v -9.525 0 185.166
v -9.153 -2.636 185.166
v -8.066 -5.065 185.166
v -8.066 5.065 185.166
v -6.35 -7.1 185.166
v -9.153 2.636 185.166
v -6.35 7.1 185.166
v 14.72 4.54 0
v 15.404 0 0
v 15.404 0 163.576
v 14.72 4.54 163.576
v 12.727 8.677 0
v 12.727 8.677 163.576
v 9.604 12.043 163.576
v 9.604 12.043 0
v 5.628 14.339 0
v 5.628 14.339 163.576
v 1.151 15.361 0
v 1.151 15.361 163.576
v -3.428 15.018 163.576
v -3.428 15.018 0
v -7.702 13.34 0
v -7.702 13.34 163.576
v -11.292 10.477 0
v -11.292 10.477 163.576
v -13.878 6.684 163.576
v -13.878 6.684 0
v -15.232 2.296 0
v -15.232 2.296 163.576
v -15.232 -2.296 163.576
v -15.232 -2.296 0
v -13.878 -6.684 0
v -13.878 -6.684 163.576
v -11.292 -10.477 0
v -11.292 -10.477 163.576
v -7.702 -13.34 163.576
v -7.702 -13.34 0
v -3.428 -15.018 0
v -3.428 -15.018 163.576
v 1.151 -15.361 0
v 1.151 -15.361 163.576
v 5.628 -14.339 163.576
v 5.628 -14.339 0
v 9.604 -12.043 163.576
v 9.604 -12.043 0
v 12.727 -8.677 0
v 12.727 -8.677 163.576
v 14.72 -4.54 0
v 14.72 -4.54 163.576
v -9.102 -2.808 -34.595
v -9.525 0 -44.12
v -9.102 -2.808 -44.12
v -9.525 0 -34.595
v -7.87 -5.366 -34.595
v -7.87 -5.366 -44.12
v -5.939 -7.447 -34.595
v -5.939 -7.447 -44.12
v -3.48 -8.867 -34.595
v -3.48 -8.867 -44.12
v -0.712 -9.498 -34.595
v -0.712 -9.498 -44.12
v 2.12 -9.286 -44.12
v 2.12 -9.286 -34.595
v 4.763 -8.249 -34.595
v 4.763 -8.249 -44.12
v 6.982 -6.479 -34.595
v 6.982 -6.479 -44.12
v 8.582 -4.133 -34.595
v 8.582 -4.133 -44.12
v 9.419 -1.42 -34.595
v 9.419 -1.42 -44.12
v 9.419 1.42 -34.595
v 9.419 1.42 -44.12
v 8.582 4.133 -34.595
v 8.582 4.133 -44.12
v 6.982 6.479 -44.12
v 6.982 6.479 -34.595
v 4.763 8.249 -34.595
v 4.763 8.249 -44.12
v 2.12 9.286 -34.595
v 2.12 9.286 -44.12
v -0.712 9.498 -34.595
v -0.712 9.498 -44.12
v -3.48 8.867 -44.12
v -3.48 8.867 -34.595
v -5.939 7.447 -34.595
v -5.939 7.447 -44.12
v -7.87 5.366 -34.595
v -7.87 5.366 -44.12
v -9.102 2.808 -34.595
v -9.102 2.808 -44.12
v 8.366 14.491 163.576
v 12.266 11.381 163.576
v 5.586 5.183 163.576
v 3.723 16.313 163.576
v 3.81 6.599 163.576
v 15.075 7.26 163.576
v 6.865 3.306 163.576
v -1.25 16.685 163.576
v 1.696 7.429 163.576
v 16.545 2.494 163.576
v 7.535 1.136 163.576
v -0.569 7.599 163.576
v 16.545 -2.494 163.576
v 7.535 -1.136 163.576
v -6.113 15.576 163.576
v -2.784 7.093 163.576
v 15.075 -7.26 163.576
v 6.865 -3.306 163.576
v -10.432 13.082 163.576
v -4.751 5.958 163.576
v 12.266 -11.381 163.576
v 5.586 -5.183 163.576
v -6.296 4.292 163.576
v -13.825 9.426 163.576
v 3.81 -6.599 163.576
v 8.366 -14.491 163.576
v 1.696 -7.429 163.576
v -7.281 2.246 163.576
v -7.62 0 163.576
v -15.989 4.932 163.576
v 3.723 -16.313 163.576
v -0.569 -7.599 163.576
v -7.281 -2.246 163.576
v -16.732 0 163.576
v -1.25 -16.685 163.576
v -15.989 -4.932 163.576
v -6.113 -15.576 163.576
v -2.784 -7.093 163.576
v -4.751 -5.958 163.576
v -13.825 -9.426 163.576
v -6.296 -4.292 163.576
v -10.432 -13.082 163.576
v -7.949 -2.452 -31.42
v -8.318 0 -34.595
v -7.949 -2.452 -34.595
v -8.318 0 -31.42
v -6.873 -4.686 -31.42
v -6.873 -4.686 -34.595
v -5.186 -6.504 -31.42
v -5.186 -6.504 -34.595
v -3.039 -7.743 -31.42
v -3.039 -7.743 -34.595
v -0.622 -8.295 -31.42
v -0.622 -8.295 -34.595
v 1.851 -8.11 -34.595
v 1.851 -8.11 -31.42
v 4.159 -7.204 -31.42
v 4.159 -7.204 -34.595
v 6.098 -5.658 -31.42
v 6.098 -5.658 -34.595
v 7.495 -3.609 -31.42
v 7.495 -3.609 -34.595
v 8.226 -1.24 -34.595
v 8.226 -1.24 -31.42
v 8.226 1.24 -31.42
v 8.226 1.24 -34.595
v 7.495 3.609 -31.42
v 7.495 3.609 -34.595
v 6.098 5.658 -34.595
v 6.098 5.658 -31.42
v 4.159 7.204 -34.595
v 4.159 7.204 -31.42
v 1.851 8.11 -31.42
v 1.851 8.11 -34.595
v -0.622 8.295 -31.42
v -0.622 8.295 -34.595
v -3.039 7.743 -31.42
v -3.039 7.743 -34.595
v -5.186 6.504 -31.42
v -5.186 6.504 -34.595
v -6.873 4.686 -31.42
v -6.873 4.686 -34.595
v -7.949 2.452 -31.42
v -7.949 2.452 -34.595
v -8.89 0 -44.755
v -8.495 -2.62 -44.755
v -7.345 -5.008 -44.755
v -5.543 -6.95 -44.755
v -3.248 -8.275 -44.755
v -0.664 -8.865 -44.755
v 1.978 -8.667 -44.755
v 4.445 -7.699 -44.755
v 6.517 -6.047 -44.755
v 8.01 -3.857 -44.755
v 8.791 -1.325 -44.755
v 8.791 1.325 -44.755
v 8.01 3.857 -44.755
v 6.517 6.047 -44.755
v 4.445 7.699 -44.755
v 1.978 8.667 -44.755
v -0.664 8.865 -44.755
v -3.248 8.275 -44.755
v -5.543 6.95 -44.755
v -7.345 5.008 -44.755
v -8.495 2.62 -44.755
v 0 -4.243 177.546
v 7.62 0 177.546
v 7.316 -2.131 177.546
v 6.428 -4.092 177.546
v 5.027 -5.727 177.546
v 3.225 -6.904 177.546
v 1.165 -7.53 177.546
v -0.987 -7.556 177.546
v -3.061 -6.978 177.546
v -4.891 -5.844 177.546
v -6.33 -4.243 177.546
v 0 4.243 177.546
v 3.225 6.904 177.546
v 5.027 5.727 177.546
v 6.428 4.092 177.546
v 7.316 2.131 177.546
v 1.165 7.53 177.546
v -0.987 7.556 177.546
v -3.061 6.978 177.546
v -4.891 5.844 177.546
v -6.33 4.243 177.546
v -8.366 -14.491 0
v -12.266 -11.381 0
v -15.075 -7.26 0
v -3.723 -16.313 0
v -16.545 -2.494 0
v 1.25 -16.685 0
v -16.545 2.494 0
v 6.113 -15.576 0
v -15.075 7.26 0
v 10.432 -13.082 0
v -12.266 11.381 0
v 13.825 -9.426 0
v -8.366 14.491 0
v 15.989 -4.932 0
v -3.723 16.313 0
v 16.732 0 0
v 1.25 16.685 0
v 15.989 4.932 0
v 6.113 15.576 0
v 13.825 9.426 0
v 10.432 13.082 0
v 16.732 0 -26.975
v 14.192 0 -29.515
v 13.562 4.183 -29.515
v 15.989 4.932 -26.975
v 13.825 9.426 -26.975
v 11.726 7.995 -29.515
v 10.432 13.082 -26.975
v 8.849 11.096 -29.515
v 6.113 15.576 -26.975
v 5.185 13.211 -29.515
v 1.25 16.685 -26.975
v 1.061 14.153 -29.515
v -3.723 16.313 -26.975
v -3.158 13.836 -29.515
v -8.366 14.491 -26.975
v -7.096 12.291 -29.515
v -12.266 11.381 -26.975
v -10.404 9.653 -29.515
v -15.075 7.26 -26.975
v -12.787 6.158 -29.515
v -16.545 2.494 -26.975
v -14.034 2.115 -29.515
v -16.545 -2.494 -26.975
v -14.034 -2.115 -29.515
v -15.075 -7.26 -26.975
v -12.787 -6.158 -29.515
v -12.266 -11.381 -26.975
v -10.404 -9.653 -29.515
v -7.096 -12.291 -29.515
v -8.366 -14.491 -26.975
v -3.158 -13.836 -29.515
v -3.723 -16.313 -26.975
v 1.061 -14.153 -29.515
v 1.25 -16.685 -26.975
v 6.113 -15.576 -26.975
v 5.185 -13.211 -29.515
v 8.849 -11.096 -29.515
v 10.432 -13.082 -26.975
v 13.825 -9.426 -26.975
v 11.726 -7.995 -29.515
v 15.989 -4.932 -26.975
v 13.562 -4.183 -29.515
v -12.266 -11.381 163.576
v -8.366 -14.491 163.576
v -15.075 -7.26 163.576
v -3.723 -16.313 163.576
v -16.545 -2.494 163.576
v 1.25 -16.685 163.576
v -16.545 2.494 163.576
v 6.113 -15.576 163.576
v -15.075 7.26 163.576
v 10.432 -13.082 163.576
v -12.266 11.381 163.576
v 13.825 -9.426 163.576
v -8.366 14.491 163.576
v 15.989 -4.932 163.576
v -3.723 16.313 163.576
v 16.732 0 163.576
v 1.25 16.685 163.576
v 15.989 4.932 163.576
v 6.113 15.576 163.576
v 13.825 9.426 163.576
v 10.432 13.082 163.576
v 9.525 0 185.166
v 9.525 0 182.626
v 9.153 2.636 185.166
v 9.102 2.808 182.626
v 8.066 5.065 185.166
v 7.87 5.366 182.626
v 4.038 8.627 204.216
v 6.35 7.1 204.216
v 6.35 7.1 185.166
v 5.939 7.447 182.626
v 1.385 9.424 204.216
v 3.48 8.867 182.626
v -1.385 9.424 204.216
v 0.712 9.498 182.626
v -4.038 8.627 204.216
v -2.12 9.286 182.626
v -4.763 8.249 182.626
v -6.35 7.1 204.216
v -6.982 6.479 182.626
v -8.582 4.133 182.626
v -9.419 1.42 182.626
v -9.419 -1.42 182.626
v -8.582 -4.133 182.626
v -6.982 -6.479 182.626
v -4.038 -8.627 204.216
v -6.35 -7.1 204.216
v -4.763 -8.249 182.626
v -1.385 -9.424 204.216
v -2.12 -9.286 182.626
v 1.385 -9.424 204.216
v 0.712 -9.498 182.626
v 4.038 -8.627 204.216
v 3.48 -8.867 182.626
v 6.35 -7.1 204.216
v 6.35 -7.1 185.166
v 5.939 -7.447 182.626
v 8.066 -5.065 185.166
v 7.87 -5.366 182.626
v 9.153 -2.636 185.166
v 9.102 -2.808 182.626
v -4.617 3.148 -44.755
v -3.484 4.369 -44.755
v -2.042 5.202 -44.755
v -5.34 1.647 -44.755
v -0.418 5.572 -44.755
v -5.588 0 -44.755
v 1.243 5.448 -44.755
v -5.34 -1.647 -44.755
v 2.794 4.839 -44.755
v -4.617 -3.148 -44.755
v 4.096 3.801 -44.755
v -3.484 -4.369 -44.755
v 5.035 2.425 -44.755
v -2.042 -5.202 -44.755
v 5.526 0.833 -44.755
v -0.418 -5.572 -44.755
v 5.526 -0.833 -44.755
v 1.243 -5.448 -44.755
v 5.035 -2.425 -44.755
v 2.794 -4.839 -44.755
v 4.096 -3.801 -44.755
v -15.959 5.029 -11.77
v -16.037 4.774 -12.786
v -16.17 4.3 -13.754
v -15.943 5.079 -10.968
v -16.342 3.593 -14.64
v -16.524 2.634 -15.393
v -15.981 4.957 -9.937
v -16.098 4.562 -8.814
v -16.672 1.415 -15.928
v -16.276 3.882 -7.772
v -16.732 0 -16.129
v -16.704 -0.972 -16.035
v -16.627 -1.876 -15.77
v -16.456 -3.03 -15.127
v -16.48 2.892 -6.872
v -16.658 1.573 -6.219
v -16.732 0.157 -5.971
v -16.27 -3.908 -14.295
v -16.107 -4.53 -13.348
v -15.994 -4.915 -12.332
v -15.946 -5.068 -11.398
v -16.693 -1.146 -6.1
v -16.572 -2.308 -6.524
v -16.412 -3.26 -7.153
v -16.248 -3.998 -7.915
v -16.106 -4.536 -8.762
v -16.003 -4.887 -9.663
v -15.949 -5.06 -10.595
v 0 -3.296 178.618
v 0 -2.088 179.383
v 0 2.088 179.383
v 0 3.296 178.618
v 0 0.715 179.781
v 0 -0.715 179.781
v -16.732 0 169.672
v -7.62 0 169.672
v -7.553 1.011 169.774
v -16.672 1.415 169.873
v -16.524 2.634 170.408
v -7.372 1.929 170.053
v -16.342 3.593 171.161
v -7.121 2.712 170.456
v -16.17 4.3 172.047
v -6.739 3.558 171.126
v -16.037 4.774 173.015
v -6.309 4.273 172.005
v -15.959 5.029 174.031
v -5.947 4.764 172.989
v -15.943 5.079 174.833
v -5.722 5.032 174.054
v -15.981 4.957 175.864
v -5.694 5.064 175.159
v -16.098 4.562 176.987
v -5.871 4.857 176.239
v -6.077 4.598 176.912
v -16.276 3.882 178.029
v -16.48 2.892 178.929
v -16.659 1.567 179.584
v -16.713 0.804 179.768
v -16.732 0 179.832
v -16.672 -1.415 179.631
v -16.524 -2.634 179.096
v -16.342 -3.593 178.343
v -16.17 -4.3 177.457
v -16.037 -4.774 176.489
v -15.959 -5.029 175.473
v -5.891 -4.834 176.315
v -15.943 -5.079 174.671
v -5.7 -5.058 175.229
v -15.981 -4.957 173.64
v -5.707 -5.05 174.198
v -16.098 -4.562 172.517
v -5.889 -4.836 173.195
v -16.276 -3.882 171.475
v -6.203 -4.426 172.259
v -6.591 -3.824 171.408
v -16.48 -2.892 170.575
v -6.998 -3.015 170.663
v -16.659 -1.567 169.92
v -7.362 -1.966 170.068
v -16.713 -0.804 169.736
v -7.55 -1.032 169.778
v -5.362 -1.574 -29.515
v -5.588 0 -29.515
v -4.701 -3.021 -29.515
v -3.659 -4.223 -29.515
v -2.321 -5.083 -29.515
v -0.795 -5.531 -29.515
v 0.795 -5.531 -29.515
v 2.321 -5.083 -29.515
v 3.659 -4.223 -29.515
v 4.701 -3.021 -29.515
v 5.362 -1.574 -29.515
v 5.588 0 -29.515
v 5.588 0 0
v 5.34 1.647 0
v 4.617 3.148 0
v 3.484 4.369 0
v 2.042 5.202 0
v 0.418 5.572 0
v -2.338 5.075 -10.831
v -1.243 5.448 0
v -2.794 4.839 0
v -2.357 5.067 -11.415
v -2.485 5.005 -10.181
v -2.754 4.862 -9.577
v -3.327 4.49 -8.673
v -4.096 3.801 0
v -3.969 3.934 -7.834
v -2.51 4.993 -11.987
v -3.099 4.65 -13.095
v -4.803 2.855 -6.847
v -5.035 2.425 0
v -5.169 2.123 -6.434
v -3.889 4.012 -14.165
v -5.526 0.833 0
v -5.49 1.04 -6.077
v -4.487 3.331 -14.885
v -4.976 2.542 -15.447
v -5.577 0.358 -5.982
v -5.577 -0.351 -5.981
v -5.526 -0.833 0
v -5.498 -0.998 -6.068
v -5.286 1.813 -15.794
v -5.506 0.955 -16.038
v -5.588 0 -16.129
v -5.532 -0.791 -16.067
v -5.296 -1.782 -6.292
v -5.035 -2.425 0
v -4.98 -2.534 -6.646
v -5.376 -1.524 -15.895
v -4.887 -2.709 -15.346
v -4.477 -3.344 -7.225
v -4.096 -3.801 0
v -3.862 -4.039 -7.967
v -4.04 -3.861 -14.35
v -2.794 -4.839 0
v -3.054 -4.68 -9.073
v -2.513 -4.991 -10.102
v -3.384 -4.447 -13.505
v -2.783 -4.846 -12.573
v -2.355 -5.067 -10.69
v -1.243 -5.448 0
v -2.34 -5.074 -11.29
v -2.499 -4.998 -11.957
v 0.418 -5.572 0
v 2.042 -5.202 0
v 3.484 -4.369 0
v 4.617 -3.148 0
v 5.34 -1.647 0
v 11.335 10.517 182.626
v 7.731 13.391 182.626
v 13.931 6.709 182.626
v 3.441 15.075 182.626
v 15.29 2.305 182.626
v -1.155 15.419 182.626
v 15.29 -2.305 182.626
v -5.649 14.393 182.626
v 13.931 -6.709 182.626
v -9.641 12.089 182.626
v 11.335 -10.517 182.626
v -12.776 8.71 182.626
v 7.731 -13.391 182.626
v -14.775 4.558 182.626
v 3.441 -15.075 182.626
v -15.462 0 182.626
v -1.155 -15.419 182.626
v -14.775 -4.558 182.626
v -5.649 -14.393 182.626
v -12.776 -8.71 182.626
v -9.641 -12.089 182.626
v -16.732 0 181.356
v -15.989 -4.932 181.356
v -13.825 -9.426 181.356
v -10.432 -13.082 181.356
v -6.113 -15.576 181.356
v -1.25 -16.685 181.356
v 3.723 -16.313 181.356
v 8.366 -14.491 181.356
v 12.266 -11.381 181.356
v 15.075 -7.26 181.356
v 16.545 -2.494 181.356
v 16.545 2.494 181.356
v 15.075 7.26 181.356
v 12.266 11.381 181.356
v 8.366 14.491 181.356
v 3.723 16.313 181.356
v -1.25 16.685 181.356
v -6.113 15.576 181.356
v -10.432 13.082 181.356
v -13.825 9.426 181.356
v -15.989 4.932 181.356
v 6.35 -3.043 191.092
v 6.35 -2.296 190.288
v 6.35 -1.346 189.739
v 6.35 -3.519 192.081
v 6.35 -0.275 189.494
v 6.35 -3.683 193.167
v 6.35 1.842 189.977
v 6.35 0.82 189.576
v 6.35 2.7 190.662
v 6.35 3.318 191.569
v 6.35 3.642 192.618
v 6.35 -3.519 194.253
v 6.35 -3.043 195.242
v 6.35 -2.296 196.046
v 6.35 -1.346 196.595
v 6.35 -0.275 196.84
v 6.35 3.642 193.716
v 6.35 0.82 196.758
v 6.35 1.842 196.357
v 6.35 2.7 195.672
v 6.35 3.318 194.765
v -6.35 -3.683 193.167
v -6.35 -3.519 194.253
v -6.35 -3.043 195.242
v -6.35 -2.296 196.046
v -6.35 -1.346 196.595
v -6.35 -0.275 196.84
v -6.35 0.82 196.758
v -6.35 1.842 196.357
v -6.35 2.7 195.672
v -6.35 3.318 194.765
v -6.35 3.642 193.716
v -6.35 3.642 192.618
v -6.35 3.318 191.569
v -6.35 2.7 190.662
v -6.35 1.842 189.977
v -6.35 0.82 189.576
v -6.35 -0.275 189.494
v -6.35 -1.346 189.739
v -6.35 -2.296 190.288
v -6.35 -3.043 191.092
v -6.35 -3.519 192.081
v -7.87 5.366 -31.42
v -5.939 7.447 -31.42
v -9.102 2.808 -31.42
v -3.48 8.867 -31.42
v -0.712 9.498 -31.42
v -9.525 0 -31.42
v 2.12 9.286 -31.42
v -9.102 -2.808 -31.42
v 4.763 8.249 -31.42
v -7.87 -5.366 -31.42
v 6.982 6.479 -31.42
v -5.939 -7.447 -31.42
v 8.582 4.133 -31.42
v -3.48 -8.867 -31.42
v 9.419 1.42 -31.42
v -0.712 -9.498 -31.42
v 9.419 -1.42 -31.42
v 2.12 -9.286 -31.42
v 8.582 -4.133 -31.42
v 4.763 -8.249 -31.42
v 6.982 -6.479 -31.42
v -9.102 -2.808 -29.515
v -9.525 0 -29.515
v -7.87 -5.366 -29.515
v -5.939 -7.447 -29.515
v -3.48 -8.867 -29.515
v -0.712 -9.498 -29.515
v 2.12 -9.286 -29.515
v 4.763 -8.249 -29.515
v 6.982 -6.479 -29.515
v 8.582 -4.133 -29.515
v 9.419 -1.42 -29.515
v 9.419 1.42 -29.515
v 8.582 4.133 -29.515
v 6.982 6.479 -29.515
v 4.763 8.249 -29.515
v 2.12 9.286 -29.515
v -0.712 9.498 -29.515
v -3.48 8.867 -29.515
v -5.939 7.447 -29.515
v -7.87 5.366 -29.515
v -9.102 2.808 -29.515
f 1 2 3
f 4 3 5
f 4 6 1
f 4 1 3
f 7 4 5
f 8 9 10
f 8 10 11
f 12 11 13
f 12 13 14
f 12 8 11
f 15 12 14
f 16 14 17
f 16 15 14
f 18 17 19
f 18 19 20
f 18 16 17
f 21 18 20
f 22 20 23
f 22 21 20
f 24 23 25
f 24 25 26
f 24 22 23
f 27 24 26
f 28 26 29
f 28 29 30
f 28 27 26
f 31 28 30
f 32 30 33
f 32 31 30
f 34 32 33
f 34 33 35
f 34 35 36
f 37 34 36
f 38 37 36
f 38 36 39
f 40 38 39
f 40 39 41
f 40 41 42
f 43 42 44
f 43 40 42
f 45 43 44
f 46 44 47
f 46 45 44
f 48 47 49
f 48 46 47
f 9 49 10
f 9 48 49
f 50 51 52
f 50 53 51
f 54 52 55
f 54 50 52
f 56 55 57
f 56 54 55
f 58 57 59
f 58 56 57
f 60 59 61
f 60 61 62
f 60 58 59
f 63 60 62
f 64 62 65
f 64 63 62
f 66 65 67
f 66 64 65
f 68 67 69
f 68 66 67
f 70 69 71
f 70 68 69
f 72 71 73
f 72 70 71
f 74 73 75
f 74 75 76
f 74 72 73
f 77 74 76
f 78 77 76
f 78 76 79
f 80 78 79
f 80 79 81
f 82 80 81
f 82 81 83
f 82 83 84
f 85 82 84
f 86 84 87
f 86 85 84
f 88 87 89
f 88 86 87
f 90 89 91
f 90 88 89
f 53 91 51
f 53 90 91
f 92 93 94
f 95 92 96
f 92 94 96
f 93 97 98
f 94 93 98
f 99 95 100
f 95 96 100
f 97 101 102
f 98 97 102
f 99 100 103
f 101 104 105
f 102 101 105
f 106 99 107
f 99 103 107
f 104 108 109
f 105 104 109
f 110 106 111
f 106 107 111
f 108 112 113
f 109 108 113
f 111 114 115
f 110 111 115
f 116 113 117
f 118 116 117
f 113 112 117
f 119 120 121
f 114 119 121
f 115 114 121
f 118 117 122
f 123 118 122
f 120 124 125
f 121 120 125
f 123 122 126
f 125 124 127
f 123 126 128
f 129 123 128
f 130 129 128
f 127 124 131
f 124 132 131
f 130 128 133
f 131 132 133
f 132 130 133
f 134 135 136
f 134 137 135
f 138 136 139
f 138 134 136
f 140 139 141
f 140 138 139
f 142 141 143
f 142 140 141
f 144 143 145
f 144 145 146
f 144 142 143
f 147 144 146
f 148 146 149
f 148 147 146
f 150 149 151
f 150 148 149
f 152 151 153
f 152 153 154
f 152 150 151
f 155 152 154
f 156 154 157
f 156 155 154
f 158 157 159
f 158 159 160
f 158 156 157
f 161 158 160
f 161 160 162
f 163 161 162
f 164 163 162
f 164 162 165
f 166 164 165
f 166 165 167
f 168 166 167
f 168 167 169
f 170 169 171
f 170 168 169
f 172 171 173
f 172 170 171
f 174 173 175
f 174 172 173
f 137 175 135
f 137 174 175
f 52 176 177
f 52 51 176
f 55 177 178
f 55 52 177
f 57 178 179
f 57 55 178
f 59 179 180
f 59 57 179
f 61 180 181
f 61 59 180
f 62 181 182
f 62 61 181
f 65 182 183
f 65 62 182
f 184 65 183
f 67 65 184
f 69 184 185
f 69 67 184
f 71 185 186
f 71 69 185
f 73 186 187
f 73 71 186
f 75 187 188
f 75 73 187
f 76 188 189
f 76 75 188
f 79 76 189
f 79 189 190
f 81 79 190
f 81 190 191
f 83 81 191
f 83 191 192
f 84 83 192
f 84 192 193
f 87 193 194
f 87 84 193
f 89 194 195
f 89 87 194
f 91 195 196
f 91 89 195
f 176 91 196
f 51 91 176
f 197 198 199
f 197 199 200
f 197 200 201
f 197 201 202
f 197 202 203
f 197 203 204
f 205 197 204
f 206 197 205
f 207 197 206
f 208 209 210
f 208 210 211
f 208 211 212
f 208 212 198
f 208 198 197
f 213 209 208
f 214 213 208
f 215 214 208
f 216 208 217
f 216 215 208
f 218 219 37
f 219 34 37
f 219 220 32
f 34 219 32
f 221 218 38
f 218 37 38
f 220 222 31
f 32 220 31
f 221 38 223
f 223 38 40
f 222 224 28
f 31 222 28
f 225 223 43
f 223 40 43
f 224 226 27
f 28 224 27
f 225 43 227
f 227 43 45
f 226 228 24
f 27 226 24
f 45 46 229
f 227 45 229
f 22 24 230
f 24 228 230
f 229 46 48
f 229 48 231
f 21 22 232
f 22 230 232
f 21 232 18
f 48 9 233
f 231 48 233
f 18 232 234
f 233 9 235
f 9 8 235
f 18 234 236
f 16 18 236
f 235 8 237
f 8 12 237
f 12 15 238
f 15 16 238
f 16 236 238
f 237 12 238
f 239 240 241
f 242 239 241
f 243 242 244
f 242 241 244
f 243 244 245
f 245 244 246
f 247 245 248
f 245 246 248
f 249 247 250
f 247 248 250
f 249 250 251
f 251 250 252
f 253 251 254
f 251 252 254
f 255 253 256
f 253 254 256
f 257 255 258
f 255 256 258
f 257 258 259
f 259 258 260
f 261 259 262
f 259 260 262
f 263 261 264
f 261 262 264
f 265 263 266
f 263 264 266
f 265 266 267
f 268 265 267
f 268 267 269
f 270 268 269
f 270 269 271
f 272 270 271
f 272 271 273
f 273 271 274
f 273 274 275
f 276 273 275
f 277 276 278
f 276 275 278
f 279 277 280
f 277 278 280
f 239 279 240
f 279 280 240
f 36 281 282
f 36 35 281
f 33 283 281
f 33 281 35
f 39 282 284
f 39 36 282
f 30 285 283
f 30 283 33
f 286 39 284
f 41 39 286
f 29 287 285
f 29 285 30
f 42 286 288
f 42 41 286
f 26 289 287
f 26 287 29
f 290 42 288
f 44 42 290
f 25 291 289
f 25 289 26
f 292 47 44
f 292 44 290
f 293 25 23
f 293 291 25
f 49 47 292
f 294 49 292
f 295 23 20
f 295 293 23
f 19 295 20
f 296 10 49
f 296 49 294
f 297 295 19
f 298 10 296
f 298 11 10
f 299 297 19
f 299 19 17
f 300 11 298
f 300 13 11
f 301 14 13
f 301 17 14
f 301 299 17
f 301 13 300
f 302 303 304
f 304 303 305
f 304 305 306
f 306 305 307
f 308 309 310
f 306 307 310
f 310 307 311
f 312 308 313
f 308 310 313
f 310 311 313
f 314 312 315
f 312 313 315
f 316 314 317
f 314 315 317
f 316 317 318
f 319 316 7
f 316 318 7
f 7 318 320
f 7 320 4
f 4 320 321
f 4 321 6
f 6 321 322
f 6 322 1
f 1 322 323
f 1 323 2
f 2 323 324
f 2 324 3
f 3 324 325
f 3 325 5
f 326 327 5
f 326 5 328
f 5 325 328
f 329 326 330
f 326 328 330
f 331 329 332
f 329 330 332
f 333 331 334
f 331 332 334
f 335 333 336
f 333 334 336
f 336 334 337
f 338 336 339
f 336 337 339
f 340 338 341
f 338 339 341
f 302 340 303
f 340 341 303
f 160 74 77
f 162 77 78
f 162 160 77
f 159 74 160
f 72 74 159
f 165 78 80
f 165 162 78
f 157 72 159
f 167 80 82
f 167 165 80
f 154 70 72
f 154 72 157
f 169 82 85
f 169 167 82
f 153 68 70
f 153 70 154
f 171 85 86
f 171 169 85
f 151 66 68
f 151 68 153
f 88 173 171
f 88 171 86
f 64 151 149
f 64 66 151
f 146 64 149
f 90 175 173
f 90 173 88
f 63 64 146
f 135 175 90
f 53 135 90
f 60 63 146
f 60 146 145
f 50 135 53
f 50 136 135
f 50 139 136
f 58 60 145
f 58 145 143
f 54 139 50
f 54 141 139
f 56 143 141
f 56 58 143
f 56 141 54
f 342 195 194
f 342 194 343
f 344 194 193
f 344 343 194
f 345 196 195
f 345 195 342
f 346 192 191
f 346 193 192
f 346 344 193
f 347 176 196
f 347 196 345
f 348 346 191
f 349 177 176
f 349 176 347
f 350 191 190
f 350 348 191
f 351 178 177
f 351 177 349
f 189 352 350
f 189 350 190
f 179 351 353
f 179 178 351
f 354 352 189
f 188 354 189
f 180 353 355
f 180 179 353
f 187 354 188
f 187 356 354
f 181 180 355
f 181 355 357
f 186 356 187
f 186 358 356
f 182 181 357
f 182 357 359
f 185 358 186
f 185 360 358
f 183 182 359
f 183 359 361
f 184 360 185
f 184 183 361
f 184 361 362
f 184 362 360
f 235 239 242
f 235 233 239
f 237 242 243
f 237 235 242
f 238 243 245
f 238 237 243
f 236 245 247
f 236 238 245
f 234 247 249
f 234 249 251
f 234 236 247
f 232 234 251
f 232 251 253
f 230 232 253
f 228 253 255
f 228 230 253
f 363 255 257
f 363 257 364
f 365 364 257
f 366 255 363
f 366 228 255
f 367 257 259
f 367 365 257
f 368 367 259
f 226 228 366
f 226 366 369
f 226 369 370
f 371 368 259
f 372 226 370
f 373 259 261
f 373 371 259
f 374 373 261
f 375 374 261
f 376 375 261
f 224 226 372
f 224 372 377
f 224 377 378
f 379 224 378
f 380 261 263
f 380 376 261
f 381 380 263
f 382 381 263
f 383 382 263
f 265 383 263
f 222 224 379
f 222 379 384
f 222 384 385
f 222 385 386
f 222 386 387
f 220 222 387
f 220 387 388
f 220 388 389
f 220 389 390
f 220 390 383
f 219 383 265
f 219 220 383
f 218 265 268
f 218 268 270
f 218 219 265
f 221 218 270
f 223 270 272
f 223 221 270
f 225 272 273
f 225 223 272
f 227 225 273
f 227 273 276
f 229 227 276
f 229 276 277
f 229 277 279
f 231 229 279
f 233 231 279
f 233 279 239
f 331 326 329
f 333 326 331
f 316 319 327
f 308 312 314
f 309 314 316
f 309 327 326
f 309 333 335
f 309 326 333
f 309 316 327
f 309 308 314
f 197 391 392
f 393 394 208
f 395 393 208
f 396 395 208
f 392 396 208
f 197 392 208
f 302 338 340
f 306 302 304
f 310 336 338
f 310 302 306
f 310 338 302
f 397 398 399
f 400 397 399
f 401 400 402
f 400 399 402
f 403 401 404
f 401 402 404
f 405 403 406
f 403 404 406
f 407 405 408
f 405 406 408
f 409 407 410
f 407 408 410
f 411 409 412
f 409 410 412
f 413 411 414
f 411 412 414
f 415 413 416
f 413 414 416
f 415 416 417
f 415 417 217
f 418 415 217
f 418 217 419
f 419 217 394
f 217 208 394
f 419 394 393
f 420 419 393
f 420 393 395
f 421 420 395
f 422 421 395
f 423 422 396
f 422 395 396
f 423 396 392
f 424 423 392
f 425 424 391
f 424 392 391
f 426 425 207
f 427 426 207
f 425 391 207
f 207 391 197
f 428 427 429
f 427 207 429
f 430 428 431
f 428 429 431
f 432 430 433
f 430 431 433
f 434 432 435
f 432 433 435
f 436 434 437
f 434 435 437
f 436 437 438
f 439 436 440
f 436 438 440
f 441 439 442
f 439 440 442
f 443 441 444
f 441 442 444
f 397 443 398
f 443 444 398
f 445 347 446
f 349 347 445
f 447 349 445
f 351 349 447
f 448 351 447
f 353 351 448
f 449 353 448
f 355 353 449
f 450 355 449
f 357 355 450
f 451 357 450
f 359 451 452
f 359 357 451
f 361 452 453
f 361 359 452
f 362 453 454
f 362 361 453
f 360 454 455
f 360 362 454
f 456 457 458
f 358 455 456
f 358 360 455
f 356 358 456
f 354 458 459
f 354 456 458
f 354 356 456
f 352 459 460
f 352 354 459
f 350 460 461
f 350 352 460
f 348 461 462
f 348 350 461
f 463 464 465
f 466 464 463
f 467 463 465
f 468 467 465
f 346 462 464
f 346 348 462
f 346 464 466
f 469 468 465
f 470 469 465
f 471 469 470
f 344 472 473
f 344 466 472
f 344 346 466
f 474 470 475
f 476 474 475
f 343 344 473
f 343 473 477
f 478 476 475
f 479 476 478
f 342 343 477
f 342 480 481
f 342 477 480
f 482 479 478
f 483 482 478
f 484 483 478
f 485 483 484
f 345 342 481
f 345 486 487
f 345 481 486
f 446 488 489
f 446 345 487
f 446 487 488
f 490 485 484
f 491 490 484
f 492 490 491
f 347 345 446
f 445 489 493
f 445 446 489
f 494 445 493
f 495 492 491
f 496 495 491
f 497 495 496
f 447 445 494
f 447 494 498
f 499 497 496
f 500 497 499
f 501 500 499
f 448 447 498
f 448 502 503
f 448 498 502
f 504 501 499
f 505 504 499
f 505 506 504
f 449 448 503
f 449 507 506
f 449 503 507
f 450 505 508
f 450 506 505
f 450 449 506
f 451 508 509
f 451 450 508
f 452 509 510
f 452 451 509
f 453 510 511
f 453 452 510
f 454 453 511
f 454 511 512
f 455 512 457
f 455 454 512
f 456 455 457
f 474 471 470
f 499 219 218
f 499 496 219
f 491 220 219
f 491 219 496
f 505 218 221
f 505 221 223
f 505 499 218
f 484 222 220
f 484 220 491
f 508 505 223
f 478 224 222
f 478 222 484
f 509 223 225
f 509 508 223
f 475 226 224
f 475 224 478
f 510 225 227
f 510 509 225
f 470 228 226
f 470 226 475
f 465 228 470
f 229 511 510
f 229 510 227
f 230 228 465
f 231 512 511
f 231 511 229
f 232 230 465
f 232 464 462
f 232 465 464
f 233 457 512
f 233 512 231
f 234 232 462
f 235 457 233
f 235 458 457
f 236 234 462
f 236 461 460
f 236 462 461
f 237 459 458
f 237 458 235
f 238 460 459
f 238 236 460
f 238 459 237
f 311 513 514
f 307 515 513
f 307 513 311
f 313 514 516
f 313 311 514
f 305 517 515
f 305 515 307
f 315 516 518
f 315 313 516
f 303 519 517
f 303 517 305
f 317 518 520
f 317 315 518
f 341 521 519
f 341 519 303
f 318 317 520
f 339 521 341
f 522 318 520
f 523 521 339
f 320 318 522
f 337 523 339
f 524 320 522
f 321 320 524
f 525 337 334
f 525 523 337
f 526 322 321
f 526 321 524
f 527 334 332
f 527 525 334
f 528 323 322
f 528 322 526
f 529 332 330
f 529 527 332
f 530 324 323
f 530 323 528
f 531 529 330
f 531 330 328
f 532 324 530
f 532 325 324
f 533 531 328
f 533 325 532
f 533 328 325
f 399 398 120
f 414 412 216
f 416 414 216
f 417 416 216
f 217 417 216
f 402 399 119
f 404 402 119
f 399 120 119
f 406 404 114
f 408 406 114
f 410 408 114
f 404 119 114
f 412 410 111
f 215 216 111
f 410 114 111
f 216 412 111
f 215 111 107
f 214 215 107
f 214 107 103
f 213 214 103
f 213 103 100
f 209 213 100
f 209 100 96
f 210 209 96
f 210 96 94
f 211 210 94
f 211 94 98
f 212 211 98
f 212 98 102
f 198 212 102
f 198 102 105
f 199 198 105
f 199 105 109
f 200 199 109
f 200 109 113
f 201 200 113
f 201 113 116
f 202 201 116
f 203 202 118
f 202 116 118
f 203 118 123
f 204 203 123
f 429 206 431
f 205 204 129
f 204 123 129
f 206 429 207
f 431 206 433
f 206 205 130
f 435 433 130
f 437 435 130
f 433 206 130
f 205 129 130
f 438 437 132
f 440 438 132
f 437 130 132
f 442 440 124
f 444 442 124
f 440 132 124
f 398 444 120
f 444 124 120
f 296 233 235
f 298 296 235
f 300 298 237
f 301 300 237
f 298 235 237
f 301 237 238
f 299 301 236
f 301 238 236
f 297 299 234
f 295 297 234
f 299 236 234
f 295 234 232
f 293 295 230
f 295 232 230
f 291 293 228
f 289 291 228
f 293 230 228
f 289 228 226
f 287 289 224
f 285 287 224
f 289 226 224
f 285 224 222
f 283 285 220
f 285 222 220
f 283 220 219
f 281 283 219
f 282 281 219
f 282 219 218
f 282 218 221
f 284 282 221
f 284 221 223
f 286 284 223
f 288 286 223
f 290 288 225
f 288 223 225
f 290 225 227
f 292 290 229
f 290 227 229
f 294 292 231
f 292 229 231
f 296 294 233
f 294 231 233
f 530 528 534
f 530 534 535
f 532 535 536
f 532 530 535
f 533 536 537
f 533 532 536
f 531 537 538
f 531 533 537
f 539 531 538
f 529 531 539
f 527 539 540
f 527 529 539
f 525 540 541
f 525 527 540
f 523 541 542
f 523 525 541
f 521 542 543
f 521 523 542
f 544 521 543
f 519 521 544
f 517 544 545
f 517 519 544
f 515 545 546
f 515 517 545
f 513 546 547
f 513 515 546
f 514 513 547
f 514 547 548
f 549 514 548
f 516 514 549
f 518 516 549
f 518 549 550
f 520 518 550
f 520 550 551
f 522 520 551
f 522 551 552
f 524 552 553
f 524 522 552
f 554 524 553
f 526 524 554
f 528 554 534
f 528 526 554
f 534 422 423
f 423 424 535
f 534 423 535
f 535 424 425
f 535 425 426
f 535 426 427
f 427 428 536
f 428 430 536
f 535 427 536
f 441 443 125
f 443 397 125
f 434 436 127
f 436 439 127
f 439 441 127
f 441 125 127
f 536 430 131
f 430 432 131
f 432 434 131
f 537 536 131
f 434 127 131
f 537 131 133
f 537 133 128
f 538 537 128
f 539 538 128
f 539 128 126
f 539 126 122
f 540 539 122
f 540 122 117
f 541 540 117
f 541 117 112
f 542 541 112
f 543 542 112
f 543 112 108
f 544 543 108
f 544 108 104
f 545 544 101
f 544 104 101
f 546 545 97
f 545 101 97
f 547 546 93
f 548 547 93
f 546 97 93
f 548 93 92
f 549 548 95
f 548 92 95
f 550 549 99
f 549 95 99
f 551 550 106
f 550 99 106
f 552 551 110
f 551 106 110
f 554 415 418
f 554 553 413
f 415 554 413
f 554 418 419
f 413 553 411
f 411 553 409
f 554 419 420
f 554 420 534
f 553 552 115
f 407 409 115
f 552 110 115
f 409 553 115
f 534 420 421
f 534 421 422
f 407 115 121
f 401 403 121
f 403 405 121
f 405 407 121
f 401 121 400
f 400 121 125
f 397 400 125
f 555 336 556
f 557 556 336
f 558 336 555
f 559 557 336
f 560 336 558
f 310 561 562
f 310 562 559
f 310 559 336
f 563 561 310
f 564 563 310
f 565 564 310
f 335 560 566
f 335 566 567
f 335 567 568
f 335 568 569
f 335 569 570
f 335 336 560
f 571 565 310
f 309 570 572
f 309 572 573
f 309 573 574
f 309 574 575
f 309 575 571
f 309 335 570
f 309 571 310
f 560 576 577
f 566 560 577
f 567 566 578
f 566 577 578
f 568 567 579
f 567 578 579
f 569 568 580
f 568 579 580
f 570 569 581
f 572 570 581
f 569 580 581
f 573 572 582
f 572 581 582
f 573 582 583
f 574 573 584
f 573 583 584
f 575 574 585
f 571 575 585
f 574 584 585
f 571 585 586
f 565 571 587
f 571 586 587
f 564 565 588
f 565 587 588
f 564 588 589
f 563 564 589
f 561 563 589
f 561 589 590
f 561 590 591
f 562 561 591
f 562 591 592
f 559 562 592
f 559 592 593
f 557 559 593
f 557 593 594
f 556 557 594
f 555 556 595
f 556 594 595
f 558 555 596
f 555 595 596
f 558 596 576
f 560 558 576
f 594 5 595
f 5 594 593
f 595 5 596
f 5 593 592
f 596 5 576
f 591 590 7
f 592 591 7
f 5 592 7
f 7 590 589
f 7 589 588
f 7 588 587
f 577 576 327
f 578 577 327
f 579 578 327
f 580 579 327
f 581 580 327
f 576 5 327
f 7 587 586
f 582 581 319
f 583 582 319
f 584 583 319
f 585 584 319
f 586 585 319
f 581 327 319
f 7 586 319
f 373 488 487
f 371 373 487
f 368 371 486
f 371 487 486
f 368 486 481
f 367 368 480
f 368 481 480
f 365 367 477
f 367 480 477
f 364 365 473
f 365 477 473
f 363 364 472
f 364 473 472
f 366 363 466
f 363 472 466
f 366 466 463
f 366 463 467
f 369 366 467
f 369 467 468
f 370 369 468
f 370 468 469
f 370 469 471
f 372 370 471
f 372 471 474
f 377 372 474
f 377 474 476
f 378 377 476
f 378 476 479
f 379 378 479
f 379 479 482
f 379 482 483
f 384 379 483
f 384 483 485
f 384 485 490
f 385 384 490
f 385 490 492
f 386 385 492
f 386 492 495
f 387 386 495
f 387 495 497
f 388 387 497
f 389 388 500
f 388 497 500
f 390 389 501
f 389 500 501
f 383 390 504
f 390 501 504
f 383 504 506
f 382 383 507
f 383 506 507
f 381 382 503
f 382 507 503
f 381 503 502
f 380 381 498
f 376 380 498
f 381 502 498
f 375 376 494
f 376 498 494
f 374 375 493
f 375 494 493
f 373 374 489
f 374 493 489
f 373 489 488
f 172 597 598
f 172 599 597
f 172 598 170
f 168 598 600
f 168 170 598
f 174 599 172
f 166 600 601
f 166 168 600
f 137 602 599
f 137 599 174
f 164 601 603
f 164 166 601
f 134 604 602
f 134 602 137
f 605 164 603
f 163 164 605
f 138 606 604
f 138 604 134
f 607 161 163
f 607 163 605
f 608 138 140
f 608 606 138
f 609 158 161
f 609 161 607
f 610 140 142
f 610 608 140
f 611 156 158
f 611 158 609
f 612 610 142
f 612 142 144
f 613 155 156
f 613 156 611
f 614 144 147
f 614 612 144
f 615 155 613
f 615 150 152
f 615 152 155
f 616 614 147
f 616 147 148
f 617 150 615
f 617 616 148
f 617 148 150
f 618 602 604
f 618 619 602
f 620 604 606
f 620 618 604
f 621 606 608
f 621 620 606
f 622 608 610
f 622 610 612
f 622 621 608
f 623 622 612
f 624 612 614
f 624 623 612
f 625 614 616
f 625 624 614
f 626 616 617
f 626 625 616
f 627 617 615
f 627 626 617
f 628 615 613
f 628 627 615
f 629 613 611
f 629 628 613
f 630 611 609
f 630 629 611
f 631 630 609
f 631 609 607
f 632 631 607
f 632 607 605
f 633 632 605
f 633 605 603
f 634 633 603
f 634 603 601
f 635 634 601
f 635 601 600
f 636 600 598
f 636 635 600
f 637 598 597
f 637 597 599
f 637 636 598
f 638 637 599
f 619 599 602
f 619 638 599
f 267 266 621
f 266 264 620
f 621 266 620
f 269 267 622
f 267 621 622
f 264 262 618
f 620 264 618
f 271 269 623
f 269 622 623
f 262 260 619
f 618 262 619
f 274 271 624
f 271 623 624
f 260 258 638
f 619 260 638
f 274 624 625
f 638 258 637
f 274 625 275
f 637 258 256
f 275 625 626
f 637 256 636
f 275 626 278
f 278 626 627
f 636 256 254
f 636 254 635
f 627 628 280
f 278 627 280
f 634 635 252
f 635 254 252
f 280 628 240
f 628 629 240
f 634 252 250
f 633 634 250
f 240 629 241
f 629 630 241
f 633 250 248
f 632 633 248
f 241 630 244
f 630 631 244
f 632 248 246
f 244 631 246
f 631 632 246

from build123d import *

# Parameters (mm, degrees)
SKETCH1_R               = 16.73225
SKETCH1_R_2             = 15.403927615
CYCLENDAR_DEPTH         = 163.576
SKETCH2_R               = 16.73225
SKETCH2_R_2             = 5.588
NOSE_DEPTH              = 29.5148
NOSE_CHAMFER_SIZE       = 2.54
CUT_EXTRUDE1_REACH      = 167.279
CUT_EXTRUDE1_END_RADIUS = 16.73225
SKETCH3_R               = 5.08
SKETCH6_R               = 16.73225
TAIL_DEPTH              = 19.05
TAIL_CHAMFER_SIZE       = 1.27
SKETCH7_R               = 9.525
TAIL_MOUNT_DEPTH        = 2.54
SKETCH8_R               = 9.525
BOSS_EXTRUDE5_DEPTH     = 19.05
CUT_EXTRUDE2_REACH      = 207.582
CUT_EXTRUDE2_END_RADIUS = 16.73225
SKETCH9_R               = 5.08
SKETCH10_W              = 8.464736822
SKETCH10_H              = 19.05
SKETCH10_W_2            = 6.449526643
CUT_EXTRUDE3_DEPTH      = 19.05
SKETCH11_R              = 3.683
CUT_EXTRUDE4_DEPTH      = 12.7
SKETCH12_R              = 7.62
CUT_EXTRUDE5_DEPTH      = 13.97


with BuildPart() as part:
    # Sketch1 → Cyclendar (new body)
    with BuildSketch(Plane.XY):
        Circle(SKETCH1_R)
        Circle(SKETCH1_R_2, mode=Mode.SUBTRACT)
    extrude(amount=CYCLENDAR_DEPTH)


with BuildPart() as body_2:
    # Sketch2 → Nose (new body)
    with BuildSketch(Plane.XY):
        Circle(SKETCH2_R)
        Circle(SKETCH2_R_2, mode=Mode.SUBTRACT)
    extrude(amount=-NOSE_DEPTH)

    # Nose_Chamfer
    nose_chamfer_edges = [body_2.edges().sort_by_distance(p)[0] for p in [
        (-16.73225, 0, -29.5148),
    ]]
    chamfer(nose_chamfer_edges, length=NOSE_CHAMFER_SIZE)

    # Cut-Extrude1: up to this cylinder (the profile starts inside it)
    cut_extrude1_end = Plane(origin=(0, 0, -11.049), z_dir=(0, 0, 1)) * Cylinder(CUT_EXTRUDE1_END_RADIUS, 369.0225, mode=Mode.PRIVATE)
    # Sketch3 → Cut-Extrude1 (cut, up to the surface)
    with BuildSketch(Plane(origin=(0, 0, 0), x_dir=(0, 0, -1), z_dir=(1, 0, 0)), mode=Mode.PRIVATE) as cut_extrude1_sk1:
        with Locations((11.049, 0)):
            Circle(SKETCH3_R)
    cut_extrude1_tool1 = extrude(cut_extrude1_sk1.sketch, amount=-CUT_EXTRUDE1_REACH, mode=Mode.PRIVATE) & cut_extrude1_end
    add(cut_extrude1_tool1.solids().sort_by_distance((0, 0, -11.049))[0], mode=Mode.SUBTRACT)

    # Sketch4 → Revolve1 (revolve)
    with BuildSketch(Plane(origin=(0, 0, 0), x_dir=(1, 0, 0), z_dir=(0, 1, 0))):
        Polygon((-8.89, 44.7548), (-9.525, 44.1198), (-9.525, 34.5948), (-8.3185, 34.5948), (-8.3185, 31.4198), (-9.525, 31.4198), (-9.525, 29.5148), (-5.588, 29.5148), (-5.588, 44.7548), align=None)
    revolve(axis=Axis((0, 0, -26.9748), (0, 0, 1)))


with BuildPart() as body_3:
    # Sketch6 → Tail (new body)
    with BuildSketch(Plane.XY.offset(163.576)):
        with Locations(Location((0, 0, 0), (0, 0, 180))):
            Circle(SKETCH6_R)
    extrude(amount=TAIL_DEPTH)

    # Tail_Chamfer
    tail_chamfer_edges = [body_3.edges().sort_by_distance(p)[0] for p in [
        (16.73225, 0, 182.626),
    ]]
    chamfer(tail_chamfer_edges, length=TAIL_CHAMFER_SIZE)

    # Sketch7 → Tail_Mount (add)
    with BuildSketch(Plane.XY.offset(182.626)):
        Circle(SKETCH7_R)
    extrude(amount=TAIL_MOUNT_DEPTH)

    # Sketch8 → Boss-Extrude5 (add)
    with BuildSketch(Plane.XY.offset(185.166)):
        Circle(SKETCH8_R)
    extrude(amount=BOSS_EXTRUDE5_DEPTH)

    # Cut-Extrude2: up to this cylinder (the profile starts inside it)
    cut_extrude2_end = Plane(origin=(0, 0, 174.752), z_dir=(0, 0, -1)) * Cylinder(CUT_EXTRUDE2_END_RADIUS, 449.6285, mode=Mode.PRIVATE)
    # Sketch9 → Cut-Extrude2 (cut, up to the surface)
    with BuildSketch(Plane(origin=(0, 0, 0), x_dir=(0, 0, -1), z_dir=(1, 0, 0)), mode=Mode.PRIVATE) as cut_extrude2_sk1:
        with Locations((-174.752, 0)):
            Circle(SKETCH9_R)
    cut_extrude2_tool1 = extrude(cut_extrude2_sk1.sketch, amount=-CUT_EXTRUDE2_REACH, mode=Mode.PRIVATE) & cut_extrude2_end
    add(cut_extrude2_tool1.solids().sort_by_distance((0, 0, 174.752))[0], mode=Mode.SUBTRACT)

    # Sketch10 → Cut-Extrude3 (cut)
    with BuildSketch(Plane.XY.offset(204.216)):
        with Locations((10.582368411, 0)):
            Rectangle(SKETCH10_W, SKETCH10_H)
        with Locations((-9.574763322, 0)):
            Rectangle(SKETCH10_W_2, SKETCH10_H)
    extrude(amount=-CUT_EXTRUDE3_DEPTH, mode=Mode.SUBTRACT)

    # Sketch11 → Cut-Extrude4 (cut)
    with BuildSketch(Plane.ZY.offset(6.35)):
        with Locations(Location((193.167, 0, 0), (0, 0, 270))):
            Circle(SKETCH11_R)
    extrude(amount=-CUT_EXTRUDE4_DEPTH, mode=Mode.SUBTRACT)

    # Sketch12 → Cut-Extrude5 (cut)
    with BuildSketch(Plane(origin=(0, 0, 163.576), x_dir=(-1, 0, 0), z_dir=(0, 0, -1))):
        Circle(SKETCH12_R)
    extrude(amount=-CUT_EXTRUDE5_DEPTH, mode=Mode.SUBTRACT)


solid = Compound([part.part, body_2.part, body_3.part])
